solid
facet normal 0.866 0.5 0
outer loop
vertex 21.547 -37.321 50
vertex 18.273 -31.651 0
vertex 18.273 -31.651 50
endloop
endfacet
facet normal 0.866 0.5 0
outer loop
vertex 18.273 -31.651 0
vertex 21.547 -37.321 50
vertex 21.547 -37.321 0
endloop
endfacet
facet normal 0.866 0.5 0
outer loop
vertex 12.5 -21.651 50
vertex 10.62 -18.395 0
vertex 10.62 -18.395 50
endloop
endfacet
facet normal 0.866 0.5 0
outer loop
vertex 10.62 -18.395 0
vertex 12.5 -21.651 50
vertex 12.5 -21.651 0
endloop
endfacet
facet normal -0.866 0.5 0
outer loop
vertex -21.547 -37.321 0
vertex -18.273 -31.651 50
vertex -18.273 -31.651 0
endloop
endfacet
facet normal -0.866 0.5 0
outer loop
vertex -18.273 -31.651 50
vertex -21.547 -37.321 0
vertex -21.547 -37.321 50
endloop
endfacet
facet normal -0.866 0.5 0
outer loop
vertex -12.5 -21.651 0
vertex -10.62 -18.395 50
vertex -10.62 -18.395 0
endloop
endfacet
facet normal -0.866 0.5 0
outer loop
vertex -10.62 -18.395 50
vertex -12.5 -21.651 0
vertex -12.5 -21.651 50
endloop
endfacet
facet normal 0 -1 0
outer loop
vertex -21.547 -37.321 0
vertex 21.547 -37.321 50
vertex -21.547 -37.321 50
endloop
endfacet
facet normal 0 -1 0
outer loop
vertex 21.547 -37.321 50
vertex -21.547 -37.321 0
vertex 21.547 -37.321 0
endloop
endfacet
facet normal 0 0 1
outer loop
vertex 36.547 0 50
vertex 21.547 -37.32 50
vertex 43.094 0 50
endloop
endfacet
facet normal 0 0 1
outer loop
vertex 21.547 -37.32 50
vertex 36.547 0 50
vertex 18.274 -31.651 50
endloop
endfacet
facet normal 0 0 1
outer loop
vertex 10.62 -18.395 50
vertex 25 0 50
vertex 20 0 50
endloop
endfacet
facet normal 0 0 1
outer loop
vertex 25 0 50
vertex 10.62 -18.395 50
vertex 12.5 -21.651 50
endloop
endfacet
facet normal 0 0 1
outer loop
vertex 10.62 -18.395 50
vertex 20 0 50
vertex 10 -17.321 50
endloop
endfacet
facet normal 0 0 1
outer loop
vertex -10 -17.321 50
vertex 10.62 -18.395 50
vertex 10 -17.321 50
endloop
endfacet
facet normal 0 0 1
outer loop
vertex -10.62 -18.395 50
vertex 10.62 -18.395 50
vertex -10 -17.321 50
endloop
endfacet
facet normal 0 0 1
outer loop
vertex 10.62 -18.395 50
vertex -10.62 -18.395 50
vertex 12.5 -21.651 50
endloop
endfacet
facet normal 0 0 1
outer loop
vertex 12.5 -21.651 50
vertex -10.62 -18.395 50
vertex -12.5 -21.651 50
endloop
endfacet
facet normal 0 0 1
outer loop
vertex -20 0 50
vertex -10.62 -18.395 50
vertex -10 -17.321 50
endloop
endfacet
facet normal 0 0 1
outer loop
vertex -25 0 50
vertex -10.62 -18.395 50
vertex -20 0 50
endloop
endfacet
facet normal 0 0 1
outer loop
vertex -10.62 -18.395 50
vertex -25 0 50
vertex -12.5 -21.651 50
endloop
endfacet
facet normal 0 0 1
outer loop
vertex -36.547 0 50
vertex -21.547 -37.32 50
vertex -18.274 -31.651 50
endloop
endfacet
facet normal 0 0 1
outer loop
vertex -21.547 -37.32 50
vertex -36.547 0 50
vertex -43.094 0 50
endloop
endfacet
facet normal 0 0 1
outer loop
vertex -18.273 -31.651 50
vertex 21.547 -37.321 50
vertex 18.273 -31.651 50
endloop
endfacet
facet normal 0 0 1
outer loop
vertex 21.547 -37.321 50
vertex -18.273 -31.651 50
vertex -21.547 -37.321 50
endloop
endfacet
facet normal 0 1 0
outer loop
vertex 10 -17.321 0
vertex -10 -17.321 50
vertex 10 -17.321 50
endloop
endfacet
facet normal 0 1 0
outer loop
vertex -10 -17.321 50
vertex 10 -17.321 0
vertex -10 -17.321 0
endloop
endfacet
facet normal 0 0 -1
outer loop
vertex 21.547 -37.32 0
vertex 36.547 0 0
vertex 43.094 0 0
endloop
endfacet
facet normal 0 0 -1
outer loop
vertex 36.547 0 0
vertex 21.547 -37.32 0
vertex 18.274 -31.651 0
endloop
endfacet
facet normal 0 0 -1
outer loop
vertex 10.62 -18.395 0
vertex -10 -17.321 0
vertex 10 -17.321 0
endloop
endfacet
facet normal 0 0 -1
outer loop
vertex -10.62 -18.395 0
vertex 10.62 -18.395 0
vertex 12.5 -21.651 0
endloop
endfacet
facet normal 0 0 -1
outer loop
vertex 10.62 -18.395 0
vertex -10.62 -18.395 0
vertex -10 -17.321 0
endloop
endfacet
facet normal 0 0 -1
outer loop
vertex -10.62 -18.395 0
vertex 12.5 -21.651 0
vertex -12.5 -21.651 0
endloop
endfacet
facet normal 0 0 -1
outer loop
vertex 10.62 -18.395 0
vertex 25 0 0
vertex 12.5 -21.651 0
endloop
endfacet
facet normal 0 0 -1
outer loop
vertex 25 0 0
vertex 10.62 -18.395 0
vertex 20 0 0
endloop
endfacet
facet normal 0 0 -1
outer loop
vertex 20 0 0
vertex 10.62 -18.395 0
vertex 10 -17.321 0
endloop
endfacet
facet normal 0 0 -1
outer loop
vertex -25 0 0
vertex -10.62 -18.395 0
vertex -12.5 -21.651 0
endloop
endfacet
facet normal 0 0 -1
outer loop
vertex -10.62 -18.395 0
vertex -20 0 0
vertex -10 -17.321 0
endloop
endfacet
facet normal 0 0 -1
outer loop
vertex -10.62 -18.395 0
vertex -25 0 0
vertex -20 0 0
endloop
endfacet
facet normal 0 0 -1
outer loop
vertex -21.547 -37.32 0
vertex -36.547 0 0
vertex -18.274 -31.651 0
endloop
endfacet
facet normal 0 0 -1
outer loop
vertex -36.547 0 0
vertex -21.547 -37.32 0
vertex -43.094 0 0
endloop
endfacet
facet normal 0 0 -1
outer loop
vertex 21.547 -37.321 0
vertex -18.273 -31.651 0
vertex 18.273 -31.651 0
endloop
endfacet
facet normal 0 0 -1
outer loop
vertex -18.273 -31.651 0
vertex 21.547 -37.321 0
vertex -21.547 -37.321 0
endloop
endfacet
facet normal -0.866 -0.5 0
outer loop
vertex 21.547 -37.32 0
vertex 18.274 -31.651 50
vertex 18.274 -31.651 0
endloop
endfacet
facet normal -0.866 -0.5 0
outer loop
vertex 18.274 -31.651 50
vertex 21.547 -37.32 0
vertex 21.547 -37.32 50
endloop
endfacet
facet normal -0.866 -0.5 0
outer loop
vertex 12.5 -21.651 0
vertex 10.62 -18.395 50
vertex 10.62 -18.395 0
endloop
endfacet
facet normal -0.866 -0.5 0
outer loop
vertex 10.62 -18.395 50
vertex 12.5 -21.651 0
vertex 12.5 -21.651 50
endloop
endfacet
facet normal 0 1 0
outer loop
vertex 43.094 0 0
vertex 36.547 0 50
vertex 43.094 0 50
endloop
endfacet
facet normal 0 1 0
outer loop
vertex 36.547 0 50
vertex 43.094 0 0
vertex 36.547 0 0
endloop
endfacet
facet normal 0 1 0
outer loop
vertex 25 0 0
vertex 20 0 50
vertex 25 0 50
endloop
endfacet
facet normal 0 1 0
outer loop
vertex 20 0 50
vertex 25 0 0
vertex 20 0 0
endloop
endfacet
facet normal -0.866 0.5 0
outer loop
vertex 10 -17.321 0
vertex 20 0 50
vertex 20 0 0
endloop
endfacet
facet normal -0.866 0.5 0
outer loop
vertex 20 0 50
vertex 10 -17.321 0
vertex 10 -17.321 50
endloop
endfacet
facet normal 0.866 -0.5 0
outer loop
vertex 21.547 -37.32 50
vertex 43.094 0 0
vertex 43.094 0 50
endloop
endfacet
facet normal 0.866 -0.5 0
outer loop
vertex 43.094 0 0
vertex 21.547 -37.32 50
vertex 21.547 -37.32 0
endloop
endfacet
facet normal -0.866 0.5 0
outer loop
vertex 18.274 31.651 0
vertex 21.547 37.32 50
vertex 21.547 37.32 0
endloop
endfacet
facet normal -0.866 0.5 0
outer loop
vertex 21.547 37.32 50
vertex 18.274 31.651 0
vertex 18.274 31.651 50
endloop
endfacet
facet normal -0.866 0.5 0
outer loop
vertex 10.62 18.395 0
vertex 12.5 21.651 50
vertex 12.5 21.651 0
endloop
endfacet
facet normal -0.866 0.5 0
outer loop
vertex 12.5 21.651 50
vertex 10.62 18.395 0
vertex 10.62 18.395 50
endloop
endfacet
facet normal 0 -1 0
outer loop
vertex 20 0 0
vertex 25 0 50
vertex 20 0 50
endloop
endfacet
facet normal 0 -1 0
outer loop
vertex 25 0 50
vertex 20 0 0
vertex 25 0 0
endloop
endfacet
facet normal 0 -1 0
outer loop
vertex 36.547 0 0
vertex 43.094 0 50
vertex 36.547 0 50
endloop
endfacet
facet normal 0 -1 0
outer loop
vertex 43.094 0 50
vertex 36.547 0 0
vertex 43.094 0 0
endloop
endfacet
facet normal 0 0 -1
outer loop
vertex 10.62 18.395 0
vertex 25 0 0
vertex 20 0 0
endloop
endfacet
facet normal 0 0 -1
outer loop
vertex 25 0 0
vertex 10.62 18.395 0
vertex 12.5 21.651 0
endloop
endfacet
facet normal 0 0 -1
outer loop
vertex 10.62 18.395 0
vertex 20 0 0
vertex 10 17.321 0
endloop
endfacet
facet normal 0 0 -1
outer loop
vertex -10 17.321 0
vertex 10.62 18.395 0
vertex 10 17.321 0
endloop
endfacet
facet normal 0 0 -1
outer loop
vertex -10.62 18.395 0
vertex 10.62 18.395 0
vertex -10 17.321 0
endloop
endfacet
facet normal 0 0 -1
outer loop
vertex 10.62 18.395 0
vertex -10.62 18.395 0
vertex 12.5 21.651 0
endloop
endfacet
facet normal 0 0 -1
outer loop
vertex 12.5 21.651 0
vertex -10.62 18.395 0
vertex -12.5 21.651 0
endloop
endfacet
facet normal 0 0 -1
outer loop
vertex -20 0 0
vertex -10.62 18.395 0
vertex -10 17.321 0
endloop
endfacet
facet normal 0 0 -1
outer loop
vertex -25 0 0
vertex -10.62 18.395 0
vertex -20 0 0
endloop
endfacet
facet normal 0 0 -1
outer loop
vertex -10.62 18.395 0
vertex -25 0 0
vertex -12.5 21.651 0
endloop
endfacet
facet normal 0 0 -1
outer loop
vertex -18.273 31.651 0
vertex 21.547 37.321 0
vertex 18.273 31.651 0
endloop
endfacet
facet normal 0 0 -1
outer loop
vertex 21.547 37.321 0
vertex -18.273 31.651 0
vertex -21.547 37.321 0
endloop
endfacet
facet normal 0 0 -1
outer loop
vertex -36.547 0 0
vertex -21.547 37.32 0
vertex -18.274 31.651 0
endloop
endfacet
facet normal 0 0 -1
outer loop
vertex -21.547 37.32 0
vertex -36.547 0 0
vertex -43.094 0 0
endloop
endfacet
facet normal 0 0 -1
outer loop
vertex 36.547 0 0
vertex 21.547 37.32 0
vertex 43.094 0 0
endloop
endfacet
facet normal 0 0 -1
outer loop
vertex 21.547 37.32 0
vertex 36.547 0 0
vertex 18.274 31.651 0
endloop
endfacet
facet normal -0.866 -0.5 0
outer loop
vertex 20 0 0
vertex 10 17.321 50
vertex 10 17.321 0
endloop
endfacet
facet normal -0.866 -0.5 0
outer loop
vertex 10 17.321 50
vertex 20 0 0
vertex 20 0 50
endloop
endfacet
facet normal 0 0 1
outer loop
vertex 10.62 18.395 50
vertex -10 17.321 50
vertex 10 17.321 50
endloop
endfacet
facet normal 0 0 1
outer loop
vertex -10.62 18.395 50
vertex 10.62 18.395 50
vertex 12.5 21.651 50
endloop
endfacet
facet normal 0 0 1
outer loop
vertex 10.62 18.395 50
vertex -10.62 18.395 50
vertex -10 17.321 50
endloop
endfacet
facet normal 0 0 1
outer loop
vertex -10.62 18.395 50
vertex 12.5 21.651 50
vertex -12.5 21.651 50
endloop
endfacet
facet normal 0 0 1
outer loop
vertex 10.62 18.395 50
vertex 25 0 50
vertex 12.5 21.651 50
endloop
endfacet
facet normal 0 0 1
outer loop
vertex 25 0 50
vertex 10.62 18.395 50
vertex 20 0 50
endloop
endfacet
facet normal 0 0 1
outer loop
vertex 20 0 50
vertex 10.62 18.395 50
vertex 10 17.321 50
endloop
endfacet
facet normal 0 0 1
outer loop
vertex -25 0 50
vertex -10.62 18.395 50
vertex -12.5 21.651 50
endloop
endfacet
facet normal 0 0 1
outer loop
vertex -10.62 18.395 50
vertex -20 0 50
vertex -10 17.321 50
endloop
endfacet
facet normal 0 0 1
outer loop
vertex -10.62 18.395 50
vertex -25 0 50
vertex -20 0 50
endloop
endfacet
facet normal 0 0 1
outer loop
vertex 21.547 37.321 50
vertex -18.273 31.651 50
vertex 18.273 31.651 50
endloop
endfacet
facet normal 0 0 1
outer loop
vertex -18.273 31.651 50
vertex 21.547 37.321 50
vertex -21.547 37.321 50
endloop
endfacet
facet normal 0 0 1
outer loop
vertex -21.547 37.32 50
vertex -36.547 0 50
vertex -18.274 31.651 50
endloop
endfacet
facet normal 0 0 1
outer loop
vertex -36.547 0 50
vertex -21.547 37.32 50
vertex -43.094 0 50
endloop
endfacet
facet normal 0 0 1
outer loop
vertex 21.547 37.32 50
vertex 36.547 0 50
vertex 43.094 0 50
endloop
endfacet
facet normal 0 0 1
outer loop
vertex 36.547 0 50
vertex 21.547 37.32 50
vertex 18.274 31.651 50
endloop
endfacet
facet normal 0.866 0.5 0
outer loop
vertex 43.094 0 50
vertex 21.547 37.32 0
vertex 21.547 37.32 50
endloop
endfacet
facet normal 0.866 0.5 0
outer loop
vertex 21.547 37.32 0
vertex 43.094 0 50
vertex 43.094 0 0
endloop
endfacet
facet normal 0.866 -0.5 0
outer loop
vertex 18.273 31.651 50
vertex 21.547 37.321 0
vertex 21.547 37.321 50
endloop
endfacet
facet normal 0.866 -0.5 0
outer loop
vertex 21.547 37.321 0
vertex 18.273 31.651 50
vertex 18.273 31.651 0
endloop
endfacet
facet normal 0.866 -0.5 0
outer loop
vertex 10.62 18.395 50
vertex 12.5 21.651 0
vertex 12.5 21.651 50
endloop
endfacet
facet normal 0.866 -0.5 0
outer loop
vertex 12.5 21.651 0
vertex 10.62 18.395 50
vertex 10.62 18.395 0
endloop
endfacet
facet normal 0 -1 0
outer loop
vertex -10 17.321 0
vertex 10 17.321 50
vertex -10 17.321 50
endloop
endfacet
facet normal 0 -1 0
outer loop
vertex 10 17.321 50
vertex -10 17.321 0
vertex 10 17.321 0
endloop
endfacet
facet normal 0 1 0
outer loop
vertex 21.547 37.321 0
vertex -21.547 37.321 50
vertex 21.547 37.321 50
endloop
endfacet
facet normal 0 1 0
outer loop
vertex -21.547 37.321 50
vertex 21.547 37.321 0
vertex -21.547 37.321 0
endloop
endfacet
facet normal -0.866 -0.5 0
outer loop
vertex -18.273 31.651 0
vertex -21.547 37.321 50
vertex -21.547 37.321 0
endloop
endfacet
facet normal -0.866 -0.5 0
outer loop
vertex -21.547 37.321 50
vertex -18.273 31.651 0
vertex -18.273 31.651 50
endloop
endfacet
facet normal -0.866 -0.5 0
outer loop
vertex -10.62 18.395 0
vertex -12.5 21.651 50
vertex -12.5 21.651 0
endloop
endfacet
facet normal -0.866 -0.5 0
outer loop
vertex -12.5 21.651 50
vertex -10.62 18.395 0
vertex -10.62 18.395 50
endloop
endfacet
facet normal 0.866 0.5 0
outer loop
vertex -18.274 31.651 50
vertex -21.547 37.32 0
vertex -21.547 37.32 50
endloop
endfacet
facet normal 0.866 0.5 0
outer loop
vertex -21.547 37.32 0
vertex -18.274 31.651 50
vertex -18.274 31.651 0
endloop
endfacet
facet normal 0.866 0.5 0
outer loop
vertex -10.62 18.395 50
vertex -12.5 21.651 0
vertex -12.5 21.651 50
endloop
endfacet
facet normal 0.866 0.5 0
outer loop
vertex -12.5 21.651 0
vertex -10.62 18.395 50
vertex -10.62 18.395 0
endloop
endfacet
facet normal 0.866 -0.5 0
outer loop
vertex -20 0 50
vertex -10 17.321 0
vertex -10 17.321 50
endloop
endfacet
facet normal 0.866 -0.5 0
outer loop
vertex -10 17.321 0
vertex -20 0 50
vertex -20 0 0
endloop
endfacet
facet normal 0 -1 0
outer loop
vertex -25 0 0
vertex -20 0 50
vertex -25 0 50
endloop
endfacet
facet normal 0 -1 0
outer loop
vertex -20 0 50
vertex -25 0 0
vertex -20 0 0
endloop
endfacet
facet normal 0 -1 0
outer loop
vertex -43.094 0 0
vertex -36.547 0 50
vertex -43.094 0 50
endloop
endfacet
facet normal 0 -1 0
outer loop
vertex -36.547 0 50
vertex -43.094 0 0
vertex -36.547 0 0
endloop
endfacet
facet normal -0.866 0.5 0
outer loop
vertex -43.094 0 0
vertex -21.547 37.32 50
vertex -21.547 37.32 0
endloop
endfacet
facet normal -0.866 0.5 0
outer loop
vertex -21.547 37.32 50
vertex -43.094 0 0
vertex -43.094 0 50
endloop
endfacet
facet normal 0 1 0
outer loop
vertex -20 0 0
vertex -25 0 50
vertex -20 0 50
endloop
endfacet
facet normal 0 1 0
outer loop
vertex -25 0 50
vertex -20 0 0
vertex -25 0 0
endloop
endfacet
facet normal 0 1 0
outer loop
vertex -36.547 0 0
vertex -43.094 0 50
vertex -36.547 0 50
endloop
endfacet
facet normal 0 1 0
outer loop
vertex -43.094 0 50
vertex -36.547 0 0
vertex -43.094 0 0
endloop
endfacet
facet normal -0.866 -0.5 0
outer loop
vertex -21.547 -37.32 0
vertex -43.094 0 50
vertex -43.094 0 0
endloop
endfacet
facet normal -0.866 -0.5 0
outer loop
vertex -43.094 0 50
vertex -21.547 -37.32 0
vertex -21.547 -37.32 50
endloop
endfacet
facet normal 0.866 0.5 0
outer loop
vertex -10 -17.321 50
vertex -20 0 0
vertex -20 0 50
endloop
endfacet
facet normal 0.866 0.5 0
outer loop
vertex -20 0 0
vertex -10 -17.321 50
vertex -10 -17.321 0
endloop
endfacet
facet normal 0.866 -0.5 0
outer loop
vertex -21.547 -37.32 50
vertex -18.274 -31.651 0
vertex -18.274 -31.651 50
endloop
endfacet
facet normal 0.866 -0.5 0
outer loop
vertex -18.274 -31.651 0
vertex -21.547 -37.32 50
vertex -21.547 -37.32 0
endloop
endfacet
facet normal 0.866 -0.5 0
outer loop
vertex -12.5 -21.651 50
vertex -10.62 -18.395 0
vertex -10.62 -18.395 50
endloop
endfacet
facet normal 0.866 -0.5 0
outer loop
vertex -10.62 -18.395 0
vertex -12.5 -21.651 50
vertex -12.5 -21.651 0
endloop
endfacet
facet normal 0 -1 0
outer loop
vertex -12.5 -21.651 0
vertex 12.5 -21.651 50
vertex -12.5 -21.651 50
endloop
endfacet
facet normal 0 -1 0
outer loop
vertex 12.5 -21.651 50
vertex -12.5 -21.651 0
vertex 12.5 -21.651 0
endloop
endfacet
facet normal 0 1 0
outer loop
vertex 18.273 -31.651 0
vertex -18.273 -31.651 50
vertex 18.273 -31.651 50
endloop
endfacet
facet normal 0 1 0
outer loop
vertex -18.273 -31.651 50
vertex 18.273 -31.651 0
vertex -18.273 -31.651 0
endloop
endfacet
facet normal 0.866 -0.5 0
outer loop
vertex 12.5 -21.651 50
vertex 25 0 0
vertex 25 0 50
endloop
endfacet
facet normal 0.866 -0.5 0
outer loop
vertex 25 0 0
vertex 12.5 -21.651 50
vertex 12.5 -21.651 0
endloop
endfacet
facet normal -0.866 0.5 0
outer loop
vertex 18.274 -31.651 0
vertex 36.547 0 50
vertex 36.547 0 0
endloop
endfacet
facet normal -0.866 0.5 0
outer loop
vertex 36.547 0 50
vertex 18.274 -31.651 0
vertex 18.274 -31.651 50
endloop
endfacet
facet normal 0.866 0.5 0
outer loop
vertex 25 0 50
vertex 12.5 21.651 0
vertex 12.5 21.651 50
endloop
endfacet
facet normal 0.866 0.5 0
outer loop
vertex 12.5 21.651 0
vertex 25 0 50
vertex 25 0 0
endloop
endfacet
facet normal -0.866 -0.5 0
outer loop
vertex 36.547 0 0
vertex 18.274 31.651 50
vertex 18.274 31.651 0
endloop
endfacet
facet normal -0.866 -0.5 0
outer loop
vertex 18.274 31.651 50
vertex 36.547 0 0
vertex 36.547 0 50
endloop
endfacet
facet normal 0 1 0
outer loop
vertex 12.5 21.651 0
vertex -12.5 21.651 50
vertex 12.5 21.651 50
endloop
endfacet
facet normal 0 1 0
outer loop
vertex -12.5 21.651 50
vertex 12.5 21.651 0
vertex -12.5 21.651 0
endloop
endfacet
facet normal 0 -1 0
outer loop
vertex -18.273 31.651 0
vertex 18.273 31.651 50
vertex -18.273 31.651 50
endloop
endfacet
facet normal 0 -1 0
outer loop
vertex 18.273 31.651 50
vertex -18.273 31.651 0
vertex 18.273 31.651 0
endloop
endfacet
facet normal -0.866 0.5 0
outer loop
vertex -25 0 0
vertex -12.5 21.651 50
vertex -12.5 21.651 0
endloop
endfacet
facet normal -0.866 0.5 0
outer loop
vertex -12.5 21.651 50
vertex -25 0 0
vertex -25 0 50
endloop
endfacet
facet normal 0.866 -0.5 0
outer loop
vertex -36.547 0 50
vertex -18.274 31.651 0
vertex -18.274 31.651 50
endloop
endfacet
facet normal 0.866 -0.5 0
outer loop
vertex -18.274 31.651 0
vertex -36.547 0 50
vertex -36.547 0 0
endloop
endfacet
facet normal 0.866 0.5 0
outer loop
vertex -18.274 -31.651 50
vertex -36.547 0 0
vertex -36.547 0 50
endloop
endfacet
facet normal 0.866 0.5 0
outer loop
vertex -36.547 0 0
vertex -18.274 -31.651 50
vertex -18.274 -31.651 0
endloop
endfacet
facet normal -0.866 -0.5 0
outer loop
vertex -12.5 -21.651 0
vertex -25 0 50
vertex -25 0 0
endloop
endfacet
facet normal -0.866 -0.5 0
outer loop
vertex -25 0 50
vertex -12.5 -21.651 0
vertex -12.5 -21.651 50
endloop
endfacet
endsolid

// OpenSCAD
module hexagon(inner_side, thickness) {
    outer_side = inner_side + 2 * thickness / tan(60);
    
    module trapezoid(bottom=outer_side, top=inner_side, height=thickness) {
    polygon(points=[
        [-bottom/2, -height/2],
        [+bottom/2, -height/2],
        [+top/2, +height/2],
        [-top/2, +height/2]
    ]);
    }
    
    center_radius = (tan(60) * inner_side /2) + thickness/2;
    for(i = [0:5])
        rotate([0, 0, i*60])
        linear_extrude(height = 50)
        translate([0, -center_radius])
        trapezoid(bottom = outer_side, top = inner_side, height = thickness);
}

difference() {
hexagon(20, 20);
hexagon(25, 10);
}
